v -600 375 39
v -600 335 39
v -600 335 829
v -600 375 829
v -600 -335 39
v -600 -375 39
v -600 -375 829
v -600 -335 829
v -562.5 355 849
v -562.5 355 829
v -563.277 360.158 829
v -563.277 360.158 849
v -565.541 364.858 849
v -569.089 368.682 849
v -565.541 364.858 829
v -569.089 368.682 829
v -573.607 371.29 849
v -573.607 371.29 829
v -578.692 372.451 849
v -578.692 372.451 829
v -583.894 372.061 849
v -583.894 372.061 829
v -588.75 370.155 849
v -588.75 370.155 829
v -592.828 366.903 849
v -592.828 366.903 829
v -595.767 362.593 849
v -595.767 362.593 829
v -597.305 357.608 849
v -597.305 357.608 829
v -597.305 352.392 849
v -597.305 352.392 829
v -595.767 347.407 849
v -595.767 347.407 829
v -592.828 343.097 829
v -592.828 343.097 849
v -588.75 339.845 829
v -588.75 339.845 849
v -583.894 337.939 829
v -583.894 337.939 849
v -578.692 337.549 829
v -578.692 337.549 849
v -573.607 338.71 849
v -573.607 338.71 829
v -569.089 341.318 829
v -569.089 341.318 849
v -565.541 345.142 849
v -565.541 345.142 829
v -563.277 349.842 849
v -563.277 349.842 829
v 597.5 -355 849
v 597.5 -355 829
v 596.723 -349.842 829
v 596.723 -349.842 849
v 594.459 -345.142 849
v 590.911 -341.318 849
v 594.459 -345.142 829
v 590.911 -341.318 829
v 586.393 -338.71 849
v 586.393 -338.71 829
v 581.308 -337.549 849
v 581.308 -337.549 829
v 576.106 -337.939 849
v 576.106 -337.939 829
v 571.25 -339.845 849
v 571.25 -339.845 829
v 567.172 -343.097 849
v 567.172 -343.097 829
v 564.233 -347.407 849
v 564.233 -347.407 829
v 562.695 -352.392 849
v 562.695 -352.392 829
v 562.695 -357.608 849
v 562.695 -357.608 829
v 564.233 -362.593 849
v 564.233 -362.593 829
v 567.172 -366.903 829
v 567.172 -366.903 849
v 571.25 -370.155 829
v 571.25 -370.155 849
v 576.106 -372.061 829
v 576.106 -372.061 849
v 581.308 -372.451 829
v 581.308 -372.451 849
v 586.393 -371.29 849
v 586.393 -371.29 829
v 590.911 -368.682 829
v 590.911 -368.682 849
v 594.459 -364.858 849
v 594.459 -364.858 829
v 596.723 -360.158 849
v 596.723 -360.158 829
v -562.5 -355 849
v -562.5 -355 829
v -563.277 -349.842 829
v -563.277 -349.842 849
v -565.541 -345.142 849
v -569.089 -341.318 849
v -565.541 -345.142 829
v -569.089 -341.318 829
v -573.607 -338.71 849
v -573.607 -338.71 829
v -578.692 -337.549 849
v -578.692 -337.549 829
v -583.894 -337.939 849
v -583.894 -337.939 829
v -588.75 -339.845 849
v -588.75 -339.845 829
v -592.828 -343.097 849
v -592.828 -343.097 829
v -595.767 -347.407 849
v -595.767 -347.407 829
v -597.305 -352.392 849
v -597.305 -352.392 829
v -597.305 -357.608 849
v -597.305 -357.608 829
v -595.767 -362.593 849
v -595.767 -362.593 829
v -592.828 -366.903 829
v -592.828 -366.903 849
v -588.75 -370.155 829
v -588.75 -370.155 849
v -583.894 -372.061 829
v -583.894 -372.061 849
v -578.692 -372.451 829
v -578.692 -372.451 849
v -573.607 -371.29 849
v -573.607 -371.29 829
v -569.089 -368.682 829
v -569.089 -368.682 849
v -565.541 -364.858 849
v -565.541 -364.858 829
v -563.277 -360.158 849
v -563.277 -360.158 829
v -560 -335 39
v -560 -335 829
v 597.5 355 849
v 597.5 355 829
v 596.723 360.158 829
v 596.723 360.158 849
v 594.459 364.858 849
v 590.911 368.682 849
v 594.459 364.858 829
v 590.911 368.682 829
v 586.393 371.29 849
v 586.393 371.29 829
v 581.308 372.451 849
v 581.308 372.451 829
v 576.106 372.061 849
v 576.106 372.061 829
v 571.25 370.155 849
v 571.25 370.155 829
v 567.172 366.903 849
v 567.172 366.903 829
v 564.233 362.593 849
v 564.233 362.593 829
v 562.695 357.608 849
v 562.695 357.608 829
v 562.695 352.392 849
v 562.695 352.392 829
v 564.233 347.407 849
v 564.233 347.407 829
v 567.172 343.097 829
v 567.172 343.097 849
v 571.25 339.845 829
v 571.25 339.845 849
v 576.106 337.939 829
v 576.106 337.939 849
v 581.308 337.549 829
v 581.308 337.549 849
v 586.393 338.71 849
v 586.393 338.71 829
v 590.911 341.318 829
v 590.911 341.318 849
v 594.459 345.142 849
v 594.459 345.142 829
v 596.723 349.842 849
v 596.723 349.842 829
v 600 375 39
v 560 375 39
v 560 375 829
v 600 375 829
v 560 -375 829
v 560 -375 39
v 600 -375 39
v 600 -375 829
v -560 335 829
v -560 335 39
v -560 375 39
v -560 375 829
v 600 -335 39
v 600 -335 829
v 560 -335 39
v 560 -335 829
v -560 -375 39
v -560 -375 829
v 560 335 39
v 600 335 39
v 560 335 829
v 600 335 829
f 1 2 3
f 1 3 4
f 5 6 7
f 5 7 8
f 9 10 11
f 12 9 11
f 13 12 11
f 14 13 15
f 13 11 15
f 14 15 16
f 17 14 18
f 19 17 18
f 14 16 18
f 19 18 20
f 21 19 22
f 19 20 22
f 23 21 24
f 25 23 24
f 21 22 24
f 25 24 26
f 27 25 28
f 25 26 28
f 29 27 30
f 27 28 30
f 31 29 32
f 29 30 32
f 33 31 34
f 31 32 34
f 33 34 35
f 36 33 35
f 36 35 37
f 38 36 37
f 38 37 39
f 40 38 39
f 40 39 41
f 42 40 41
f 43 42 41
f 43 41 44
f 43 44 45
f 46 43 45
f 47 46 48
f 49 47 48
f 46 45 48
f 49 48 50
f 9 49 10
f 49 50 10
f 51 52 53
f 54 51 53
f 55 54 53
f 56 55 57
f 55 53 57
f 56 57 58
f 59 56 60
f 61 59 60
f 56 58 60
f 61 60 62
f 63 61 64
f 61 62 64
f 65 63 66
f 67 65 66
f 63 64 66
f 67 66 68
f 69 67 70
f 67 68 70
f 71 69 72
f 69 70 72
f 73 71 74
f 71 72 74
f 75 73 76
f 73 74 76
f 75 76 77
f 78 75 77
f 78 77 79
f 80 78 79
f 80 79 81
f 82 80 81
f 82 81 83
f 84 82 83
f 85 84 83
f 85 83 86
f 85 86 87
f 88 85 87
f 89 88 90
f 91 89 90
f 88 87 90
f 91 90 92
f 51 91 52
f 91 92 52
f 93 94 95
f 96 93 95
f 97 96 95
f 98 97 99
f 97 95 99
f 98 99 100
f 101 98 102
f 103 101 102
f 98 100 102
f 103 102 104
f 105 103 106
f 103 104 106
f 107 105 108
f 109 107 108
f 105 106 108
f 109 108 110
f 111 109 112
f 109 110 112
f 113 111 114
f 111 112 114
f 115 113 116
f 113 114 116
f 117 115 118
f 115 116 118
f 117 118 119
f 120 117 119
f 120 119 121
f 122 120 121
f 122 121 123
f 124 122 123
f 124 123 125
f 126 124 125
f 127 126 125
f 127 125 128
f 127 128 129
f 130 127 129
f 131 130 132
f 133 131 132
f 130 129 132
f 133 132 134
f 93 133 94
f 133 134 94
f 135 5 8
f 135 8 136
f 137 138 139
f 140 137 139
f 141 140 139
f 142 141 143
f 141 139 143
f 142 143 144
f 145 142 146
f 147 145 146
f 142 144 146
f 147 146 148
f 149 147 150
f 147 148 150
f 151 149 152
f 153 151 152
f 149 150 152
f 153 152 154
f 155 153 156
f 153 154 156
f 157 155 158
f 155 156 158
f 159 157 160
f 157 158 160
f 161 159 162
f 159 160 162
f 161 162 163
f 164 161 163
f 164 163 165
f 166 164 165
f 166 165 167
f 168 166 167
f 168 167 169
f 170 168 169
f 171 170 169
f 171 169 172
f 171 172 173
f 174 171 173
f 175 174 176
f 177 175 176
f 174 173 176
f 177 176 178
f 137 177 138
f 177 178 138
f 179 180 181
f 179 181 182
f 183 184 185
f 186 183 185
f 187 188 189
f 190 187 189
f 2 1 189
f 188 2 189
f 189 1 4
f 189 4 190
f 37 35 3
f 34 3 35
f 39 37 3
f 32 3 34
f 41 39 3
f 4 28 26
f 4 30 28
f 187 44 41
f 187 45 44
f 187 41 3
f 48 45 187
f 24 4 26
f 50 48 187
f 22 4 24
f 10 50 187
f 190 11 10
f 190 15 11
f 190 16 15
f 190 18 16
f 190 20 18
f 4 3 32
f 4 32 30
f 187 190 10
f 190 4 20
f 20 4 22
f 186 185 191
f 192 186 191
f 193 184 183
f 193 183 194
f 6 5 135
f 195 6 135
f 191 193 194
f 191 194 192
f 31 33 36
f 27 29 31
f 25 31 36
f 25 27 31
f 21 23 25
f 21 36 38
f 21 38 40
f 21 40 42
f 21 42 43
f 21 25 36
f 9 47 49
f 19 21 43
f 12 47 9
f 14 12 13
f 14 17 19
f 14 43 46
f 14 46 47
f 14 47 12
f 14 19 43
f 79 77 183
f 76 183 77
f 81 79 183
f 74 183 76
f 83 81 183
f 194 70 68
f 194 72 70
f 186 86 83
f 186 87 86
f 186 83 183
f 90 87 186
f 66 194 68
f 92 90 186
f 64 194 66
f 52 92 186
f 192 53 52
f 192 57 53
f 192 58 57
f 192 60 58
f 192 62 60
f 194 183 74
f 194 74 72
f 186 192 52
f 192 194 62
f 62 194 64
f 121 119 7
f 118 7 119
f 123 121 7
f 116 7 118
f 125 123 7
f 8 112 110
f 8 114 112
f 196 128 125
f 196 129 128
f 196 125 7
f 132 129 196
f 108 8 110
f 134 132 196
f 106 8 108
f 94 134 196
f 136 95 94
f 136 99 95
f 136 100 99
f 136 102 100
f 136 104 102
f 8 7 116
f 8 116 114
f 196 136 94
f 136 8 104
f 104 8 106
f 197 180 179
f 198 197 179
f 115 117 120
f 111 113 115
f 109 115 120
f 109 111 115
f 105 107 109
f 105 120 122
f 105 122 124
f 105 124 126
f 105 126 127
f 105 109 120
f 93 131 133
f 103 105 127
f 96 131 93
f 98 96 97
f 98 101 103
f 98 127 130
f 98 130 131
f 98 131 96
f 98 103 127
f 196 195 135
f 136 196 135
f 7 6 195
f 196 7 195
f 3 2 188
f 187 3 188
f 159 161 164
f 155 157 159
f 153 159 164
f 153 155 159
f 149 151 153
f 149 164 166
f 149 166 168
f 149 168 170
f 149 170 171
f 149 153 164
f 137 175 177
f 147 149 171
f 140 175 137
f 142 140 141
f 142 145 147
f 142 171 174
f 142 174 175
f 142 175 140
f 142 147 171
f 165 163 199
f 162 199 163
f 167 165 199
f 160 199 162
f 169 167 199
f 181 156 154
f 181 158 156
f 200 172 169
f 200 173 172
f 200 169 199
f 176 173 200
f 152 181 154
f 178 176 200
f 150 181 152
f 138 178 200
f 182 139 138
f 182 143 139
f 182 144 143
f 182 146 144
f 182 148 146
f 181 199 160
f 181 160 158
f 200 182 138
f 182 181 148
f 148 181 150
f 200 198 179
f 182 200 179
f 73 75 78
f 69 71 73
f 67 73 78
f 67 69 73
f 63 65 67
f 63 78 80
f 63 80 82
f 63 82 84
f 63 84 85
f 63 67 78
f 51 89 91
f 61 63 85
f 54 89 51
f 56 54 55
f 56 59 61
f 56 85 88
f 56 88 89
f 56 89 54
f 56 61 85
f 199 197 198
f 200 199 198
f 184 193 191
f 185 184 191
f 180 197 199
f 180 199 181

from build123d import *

# Parameters (mm, degrees)
SKETCH2_W             = 40
SKETCH2_H             = 40
BOSS_EXTRUDE1_DEPTH   = 790
BOSS_EXTRUDE1_2_DEPTH = 790
BOSS_EXTRUDE1_3_DEPTH = 790
BOSS_EXTRUDE1_4_DEPTH = 790
SKETCH3_R             = 17.5
BOSS_EXTRUDE2_DEPTH   = 20


with BuildPart() as part:
    # Sketch2 → Boss-Extrude1 (new body)
    with BuildSketch(Plane.XY.offset(39)):
        with Locations((-580, 355)):
            Rectangle(SKETCH2_W, SKETCH2_H)
    extrude(amount=BOSS_EXTRUDE1_DEPTH)



with BuildPart() as body_2:
    # Sketch2 → Boss-Extrude1 2 (new body)
    with BuildSketch(Plane.XY.offset(39)):
        with Locations((580, 355)):
            Rectangle(SKETCH2_W, SKETCH2_H)
    extrude(amount=BOSS_EXTRUDE1_2_DEPTH)


with BuildPart() as body_3:
    # Sketch2 → Boss-Extrude1 3 (new body)
    with BuildSketch(Plane.XY.offset(39)):
        with Locations((580, -355)):
            Rectangle(SKETCH2_W, SKETCH2_H)
    extrude(amount=BOSS_EXTRUDE1_3_DEPTH)


with BuildPart() as body_4:
    # Sketch2 → Boss-Extrude1 4 (new body)
    with BuildSketch(Plane.XY.offset(39)):
        with Locations((-580, -355)):
            Rectangle(SKETCH2_W, SKETCH2_H)
    extrude(amount=BOSS_EXTRUDE1_4_DEPTH)


with BuildPart() as part_1:
    add(part.part)

    add(body_2.part)  # Boss-Extrude2 merges body 2

    add(body_3.part)  # Boss-Extrude2 merges body 3

    add(body_4.part)  # Boss-Extrude2 merges body 4
    # Sketch3 → Boss-Extrude2 (add)
    with BuildSketch(Plane.XY.offset(829)):
        with Locations((-580, 355)):
            Circle(SKETCH3_R)
        with Locations((580, 355)):
            Circle(SKETCH3_R)
        with Locations((-580, -355)):
            Circle(SKETCH3_R)
        with Locations((580, -355)):
            Circle(SKETCH3_R)
    extrude(amount=BOSS_EXTRUDE2_DEPTH)


solid = part_1.part
